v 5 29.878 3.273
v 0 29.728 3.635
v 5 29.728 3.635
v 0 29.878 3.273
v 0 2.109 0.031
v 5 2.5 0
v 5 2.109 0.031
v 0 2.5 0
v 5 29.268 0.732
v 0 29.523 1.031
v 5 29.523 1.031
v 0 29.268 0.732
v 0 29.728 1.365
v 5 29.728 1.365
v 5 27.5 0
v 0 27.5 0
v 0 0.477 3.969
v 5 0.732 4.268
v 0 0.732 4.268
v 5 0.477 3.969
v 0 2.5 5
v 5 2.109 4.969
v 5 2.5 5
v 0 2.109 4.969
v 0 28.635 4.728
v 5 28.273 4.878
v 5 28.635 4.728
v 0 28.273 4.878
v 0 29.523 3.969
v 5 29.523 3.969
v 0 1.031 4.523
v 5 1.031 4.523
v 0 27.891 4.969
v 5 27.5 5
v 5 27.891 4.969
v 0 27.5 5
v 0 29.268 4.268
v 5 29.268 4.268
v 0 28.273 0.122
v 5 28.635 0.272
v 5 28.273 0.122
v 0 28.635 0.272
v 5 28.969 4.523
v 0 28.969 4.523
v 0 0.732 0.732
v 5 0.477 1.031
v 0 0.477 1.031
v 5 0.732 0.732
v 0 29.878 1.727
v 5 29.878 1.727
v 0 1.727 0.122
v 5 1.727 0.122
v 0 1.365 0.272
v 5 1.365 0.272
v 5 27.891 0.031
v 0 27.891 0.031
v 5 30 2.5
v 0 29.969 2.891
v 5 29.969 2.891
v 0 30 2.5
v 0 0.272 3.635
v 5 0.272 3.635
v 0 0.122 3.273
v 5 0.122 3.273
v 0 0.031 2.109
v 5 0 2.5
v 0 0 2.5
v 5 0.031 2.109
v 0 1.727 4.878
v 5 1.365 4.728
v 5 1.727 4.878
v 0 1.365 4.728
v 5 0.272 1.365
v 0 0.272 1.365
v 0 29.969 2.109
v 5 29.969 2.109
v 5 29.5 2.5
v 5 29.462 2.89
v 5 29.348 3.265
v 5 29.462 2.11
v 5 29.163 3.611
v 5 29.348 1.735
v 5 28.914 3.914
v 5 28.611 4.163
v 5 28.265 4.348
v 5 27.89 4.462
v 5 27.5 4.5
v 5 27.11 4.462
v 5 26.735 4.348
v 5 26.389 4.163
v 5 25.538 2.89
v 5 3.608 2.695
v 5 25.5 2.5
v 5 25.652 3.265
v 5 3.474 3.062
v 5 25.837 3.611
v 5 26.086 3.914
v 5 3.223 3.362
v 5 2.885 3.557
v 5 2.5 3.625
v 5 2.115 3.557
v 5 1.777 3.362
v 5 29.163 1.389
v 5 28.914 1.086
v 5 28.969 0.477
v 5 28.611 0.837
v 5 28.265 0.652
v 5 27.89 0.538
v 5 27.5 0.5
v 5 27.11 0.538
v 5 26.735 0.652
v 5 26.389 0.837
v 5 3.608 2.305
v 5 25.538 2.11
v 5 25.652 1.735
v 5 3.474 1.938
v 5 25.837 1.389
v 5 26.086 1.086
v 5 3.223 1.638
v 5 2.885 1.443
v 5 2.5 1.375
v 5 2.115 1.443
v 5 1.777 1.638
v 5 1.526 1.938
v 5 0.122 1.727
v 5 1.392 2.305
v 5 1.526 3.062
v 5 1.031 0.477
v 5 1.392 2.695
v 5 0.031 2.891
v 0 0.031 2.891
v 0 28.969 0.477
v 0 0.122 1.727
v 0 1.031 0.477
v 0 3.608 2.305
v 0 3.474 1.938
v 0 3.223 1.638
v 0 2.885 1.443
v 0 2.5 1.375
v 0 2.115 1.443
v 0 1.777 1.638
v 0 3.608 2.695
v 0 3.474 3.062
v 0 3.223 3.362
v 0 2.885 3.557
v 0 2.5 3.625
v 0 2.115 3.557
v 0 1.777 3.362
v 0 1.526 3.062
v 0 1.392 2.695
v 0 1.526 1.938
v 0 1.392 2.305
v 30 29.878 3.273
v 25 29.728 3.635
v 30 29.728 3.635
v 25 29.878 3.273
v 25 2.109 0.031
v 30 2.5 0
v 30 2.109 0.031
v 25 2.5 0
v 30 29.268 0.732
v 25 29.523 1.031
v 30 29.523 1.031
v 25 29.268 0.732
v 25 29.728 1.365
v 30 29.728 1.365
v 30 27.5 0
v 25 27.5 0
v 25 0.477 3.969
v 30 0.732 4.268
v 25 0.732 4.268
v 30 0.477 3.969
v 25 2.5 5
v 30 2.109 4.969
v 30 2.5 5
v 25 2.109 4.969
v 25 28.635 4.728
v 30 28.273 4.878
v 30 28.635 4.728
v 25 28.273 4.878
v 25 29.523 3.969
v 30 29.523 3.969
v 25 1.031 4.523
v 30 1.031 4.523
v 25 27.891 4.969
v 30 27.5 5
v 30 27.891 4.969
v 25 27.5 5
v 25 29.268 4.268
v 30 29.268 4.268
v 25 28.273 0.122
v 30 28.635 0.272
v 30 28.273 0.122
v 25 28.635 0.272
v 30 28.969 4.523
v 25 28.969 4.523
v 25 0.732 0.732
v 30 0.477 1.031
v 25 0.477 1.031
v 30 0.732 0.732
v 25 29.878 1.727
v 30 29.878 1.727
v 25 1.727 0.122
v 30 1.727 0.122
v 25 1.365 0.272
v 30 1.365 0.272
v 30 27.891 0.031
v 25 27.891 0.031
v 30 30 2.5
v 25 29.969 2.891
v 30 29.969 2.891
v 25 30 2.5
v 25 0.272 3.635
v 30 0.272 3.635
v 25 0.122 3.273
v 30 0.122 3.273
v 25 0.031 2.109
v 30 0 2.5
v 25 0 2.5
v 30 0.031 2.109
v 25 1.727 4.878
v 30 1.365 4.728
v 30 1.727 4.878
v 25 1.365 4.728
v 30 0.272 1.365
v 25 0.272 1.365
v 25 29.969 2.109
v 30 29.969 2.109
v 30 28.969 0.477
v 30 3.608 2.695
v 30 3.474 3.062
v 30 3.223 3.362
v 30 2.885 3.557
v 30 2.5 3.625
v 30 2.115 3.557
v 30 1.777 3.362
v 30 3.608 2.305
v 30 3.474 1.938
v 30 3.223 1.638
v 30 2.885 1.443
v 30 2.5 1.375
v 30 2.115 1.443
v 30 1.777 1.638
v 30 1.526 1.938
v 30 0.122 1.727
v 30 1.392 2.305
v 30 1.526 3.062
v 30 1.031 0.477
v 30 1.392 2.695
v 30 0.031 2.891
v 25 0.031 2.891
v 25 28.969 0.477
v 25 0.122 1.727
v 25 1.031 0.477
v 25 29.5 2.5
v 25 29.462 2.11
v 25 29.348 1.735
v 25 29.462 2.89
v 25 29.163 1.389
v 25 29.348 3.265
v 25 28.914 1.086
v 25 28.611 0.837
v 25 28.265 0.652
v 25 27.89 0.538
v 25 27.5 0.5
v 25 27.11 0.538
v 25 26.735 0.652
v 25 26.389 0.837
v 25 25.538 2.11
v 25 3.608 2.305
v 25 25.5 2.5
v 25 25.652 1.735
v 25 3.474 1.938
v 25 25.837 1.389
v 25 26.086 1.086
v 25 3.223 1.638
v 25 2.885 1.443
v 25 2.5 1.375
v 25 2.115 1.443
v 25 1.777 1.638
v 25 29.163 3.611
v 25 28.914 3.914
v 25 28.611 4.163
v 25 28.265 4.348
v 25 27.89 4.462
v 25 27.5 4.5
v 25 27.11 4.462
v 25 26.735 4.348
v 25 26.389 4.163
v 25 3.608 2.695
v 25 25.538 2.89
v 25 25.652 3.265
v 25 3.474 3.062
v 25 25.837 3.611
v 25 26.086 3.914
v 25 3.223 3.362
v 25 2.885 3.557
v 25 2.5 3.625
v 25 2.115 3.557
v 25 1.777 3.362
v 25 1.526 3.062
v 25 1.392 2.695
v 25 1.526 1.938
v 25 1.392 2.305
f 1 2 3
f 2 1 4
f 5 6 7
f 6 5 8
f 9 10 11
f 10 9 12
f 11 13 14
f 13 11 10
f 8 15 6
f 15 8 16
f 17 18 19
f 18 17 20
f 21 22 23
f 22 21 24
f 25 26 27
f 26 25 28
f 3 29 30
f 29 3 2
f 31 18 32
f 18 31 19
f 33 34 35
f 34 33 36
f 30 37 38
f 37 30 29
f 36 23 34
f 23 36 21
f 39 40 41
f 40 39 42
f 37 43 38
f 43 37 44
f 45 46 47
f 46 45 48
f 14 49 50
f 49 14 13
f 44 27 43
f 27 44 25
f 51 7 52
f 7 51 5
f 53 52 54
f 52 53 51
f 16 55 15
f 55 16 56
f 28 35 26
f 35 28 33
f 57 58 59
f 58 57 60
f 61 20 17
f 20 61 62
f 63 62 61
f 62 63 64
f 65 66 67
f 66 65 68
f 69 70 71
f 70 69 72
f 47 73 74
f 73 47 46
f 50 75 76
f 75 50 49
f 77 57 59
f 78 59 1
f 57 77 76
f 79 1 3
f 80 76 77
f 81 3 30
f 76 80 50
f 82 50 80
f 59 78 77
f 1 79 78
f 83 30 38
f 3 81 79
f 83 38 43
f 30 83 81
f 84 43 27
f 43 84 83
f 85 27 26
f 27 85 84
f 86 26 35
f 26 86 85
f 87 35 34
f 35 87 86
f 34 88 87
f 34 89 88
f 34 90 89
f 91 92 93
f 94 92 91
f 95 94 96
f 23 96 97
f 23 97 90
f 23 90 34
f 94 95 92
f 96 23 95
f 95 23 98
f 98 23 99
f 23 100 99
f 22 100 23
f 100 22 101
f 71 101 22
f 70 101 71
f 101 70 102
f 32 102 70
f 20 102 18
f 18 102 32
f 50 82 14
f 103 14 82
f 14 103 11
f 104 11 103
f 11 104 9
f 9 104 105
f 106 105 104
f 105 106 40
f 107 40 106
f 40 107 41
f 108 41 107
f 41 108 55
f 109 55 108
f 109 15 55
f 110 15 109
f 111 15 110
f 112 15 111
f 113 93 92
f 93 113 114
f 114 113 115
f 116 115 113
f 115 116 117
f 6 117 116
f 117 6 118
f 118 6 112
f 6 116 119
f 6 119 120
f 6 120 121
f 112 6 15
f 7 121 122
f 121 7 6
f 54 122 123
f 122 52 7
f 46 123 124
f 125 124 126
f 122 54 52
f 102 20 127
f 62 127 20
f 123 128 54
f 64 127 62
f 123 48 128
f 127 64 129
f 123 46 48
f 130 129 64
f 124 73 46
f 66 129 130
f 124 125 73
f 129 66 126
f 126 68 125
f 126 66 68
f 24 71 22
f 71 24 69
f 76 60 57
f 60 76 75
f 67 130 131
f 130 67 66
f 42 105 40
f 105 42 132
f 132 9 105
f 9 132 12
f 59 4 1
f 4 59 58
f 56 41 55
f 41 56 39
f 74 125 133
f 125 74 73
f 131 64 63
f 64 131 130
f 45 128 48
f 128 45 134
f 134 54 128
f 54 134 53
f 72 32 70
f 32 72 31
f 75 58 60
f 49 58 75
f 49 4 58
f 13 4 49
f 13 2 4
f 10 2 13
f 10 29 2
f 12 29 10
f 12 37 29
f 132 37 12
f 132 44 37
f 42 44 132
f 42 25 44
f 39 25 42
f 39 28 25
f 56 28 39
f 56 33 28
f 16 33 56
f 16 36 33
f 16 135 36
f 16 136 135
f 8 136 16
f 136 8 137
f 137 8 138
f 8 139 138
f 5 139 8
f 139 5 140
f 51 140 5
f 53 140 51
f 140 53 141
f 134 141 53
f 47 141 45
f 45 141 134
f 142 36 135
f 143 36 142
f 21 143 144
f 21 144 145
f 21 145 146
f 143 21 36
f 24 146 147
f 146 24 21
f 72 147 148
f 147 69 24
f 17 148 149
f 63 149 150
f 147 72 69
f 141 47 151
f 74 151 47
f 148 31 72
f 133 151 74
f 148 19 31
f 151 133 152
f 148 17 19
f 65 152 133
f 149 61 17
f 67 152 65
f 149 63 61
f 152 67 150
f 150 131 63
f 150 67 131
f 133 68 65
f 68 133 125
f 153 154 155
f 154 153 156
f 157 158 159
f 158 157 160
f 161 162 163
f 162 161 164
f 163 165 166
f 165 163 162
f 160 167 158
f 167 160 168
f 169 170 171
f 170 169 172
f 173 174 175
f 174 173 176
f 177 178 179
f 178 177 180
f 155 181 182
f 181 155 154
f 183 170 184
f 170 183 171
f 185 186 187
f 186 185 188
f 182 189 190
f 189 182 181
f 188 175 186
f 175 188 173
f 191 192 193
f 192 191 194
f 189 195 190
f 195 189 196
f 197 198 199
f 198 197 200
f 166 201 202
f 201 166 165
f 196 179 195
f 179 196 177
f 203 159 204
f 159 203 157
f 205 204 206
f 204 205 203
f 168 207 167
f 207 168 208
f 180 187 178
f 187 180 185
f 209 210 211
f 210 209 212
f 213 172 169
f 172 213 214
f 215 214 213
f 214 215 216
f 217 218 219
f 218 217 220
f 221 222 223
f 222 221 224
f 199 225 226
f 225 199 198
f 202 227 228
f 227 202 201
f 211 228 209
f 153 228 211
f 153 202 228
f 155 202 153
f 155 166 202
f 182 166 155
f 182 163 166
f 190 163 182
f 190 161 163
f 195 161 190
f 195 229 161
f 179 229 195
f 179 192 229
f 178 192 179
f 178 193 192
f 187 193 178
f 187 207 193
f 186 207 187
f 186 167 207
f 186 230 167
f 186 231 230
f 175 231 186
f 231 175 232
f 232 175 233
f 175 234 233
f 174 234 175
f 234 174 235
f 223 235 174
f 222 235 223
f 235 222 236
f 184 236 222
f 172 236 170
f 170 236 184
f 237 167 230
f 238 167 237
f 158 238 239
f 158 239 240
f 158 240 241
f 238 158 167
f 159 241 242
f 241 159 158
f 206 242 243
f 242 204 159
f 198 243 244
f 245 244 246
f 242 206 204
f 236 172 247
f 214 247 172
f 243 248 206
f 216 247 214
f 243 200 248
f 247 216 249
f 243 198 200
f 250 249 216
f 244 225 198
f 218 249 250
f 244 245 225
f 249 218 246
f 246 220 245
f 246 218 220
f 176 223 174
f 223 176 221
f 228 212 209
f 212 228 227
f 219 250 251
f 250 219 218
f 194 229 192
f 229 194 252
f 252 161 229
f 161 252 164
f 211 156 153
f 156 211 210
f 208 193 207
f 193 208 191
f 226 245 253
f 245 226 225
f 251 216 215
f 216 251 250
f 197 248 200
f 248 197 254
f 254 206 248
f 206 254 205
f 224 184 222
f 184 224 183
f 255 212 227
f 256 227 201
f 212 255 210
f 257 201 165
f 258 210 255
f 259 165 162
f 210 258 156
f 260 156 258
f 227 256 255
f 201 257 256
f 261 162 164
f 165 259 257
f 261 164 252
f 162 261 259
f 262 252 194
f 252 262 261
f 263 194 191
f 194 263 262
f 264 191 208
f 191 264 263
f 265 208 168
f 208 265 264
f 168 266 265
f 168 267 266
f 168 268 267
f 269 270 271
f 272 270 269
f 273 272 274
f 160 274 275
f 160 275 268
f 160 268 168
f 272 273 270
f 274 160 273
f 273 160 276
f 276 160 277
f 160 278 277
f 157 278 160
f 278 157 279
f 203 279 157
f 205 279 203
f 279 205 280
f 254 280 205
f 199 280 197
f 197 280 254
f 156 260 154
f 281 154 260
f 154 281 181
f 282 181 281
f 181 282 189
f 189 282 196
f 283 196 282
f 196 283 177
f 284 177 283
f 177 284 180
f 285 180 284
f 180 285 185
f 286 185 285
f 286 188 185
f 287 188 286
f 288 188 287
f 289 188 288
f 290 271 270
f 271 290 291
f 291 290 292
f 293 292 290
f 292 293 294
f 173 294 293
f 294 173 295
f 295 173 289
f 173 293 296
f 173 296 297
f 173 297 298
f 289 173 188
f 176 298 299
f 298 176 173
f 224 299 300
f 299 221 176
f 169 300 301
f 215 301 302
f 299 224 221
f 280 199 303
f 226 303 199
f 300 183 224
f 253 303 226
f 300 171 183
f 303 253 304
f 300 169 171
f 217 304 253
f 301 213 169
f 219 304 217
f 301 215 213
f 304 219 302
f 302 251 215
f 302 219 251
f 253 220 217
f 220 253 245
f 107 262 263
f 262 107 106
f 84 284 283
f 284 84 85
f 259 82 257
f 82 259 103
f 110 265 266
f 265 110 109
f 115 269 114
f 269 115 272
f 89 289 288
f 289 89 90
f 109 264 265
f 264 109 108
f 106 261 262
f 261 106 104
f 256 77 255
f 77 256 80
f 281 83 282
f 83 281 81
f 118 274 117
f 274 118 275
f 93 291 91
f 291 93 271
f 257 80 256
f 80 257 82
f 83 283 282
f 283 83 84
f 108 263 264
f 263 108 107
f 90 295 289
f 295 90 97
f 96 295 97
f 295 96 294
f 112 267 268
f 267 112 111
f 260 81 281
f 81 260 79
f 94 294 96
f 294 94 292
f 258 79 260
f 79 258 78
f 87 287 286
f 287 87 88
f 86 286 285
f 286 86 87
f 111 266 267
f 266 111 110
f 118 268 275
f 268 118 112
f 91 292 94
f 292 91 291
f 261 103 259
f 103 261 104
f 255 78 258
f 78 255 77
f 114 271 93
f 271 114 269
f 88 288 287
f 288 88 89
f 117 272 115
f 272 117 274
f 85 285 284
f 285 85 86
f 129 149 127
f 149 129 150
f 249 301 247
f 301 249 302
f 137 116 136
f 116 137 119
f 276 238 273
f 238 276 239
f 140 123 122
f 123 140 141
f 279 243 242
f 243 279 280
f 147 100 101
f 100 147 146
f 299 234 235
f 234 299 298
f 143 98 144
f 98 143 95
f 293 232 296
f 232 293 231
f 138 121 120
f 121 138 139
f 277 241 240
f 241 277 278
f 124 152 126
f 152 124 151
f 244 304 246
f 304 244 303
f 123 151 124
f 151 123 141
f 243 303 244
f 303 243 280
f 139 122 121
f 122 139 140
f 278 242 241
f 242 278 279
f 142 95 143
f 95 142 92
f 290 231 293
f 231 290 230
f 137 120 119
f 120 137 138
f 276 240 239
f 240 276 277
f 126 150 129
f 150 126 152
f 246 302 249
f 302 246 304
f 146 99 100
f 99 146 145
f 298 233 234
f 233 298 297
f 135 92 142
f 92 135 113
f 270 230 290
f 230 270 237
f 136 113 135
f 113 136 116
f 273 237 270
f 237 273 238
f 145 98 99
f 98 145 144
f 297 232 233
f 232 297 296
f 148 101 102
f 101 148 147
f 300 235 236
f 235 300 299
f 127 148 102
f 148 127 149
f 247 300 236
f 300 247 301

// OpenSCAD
// file: drawLatch.scad
overallWidth = 30;    // overall outside width for the bases (if used) and the loop
toggleWidth = 20; // width of the toggle toggle
catchDepth=5;  // solid part of the catch
baseHeight = 2.5;
loopExtraLength = 0; // some extra clearence
haveBase = false;
loopSideWidth = (overallWidth-toggleWidth)/2;
basePintalWidth = overallWidth - (4*loopSideWidth);
loopHeight = 5;
loopCrossbarRadius = (loopHeight)/2 ;
toggleHeight = loopHeight *2;
catchBaseOffset = 2.5; // if starting n 2 uneaven surfaces
pinSize = 1.75; // use a peice of pla for the pin
pinR = pinSize/2;
pinClearance = 0.25;// for the pin holes that move freely
sideClearance = 0.5; // for the sides
catchWidth=toggleWidth;
catchRoundover = loopHeight/2;
catchRoundoverR = catchRoundover/2;
catchHeight = catchRoundover + loopHeight;
catchBaseHeight = baseHeight-catchBaseOffset;
catchOverallHeight = catchHeight+catchBaseHeight;
catchBaseY = catchDepth + toggleHeight;
catchDiag = toggleHeight *1.42; // diagnal or q square is sqrt(2) * side, we are cutting, so rounding up is OK.
toggleLength = 30;
togglePinOffset = toggleLength/2;
baseY = loopHeight*2.4;
loopLength = loopCrossbarRadius + loopHeight + togglePinOffset+catchDepth + loopHeight + loopExtraLength;
module roundBoxYZ(r,l,w){
  points = [[0,r,r], [0,(l-(2*r)),r] ];
    hull() {
        for(p=points) {
	  translate(p) rotate([0,90,0]) cylinder(r=r,h=w);
            }
        }
    }
module loop() {  // origin is at lower left of loop
  difference(){
    union() {
      roundBoxYZ(loopCrossbarRadius, loopLength, loopSideWidth);
      translate([toggleWidth+loopSideWidth,0,0]) roundBoxYZ(loopCrossbarRadius,loopLength,loopSideWidth);
      translate([0,(loopLength-loopHeight),loopCrossbarRadius]) rotate([0,90,0]) cylinder(r=loopCrossbarRadius-sideClearance,h=overallWidth);
    }
    // hole for the pin
    translate([-0.1,loopCrossbarRadius,loopCrossbarRadius]) rotate([0,90,0]) cylinder(r=pinR+pinClearance,h=overallWidth+0.2);
  }
}
module catchPlate(){
    echo(catchOverallHeight);
  difference(){
    union() {
      if(haveBase) { cube([overallWidth,catchBaseY,catchBaseHeight]); }
      translate([loopSideWidth+sideClearance,0,0]) cube([catchWidth-(2*sideClearance),catchDepth+loopCrossbarRadius,catchOverallHeight]); // main catch block
      translate([loopSideWidth+sideClearance,(catchDepth+loopCrossbarRadius),(catchOverallHeight-catchRoundoverR)]) 
	rotate([0,90,0]) cylinder(r=catchRoundoverR,h=catchWidth-(2*sideClearance));
    }
    // radius out catch
    translate([(loopSideWidth-0.1),(catchDepth+loopCrossbarRadius),(catchBaseHeight+loopCrossbarRadius)]) rotate([0,90,0]) cylinder(r=loopCrossbarRadius,h=catchWidth+0.2);
    // champfer bottom edge
    translate([loopSideWidth-0.1,0,(catchBaseHeight+catchRoundover)]) rotate([45,0,0]) cube([(catchWidth+0.2),catchDiag,catchDiag]);
  }
}
module toggle() {
  difference(){
    roundBoxYZ(loopCrossbarRadius, toggleLength, toggleWidth-(2*sideClearance)); // top of toggle (upside down)
	// cut in a hole for the base
      translate([loopSideWidth-sideClearance,0,-0.1]) cube([basePintalWidth,(loopHeight*2)+loopCrossbarRadius,(loopHeight +0.2)]);
    // top pin for pintle
    translate([-0.1,loopCrossbarRadius,loopCrossbarRadius]) rotate([0,90,0]) cylinder(r=pinR+pinClearance,h=overallWidth+0.2);
    translate([-0.1,togglePinOffset+loopCrossbarRadius,loopCrossbarRadius]) rotate([0,90,0]) cylinder(r=pinR+pinClearance,h=overallWidth+0.2);
  }
}
module base() {
     difference() {
    union() {
      if(haveBase) { cube([overallWidth,baseY,baseHeight]); }
      translate([(loopSideWidth*2)-sideClearance,0,0]) cube([basePintalWidth-(2*sideClearance),loopHeight*2,(baseHeight+loopHeight)]); // main catch block
      translate([(loopSideWidth*2)-sideClearance,loopCrossbarRadius,0]) cube([basePintalWidth-(2*sideClearance),loopHeight*2,(baseHeight+(loopHeight*1.5))]); // main catch block
      translate([(loopSideWidth*2)-sideClearance,loopCrossbarRadius,(baseHeight+loopHeight)]) rotate([0,90,0]) cylinder(r=loopCrossbarRadius,h=basePintalWidth-(2*sideClearance));     }
    translate([0,loopCrossbarRadius,(baseHeight+loopHeight)]) rotate([0,90,0]) cylinder(r=pinR+pinClearance,h=overallWidth+0.2);
        // champfer bottom edge
    //translate([(loopSideWidth*2)-0.1,(loopHeight*2.4),(baseHeight)]) rotate([45,0,0]) cube([(basePintalWidth+0.2),catchDiag,catchDiag]);
    // full bottom champfer
    translate([-0.1,(loopHeight*2.4)+baseHeight,0]) rotate([45,0,0]) cube([(overallWidth+0.2),catchDiag,catchDiag]);
      }
}
module assembled(){
  translate([overallWidth,loopLength-loopCrossbarRadius-catchDepth-loopHeight,baseHeight]) rotate(180) loop();
  translate([overallWidth,0,0]) rotate(180) catchPlate();
  translate([loopSideWidth,0,baseHeight]) toggle();
  base();
}
module print() {
  translate([-overallWidth-4,0,0]) loop();
  translate([0,-2,0]) rotate(180) catchPlate();
  translate([overallWidth +4,-2,0]) toggle();
  base();
}
//print();
// assembled();
//loop();
//toggle();
// main file
$fa=1;
$fs=0.4;
include <drawLatch.scad>
//toggle();
loop();
